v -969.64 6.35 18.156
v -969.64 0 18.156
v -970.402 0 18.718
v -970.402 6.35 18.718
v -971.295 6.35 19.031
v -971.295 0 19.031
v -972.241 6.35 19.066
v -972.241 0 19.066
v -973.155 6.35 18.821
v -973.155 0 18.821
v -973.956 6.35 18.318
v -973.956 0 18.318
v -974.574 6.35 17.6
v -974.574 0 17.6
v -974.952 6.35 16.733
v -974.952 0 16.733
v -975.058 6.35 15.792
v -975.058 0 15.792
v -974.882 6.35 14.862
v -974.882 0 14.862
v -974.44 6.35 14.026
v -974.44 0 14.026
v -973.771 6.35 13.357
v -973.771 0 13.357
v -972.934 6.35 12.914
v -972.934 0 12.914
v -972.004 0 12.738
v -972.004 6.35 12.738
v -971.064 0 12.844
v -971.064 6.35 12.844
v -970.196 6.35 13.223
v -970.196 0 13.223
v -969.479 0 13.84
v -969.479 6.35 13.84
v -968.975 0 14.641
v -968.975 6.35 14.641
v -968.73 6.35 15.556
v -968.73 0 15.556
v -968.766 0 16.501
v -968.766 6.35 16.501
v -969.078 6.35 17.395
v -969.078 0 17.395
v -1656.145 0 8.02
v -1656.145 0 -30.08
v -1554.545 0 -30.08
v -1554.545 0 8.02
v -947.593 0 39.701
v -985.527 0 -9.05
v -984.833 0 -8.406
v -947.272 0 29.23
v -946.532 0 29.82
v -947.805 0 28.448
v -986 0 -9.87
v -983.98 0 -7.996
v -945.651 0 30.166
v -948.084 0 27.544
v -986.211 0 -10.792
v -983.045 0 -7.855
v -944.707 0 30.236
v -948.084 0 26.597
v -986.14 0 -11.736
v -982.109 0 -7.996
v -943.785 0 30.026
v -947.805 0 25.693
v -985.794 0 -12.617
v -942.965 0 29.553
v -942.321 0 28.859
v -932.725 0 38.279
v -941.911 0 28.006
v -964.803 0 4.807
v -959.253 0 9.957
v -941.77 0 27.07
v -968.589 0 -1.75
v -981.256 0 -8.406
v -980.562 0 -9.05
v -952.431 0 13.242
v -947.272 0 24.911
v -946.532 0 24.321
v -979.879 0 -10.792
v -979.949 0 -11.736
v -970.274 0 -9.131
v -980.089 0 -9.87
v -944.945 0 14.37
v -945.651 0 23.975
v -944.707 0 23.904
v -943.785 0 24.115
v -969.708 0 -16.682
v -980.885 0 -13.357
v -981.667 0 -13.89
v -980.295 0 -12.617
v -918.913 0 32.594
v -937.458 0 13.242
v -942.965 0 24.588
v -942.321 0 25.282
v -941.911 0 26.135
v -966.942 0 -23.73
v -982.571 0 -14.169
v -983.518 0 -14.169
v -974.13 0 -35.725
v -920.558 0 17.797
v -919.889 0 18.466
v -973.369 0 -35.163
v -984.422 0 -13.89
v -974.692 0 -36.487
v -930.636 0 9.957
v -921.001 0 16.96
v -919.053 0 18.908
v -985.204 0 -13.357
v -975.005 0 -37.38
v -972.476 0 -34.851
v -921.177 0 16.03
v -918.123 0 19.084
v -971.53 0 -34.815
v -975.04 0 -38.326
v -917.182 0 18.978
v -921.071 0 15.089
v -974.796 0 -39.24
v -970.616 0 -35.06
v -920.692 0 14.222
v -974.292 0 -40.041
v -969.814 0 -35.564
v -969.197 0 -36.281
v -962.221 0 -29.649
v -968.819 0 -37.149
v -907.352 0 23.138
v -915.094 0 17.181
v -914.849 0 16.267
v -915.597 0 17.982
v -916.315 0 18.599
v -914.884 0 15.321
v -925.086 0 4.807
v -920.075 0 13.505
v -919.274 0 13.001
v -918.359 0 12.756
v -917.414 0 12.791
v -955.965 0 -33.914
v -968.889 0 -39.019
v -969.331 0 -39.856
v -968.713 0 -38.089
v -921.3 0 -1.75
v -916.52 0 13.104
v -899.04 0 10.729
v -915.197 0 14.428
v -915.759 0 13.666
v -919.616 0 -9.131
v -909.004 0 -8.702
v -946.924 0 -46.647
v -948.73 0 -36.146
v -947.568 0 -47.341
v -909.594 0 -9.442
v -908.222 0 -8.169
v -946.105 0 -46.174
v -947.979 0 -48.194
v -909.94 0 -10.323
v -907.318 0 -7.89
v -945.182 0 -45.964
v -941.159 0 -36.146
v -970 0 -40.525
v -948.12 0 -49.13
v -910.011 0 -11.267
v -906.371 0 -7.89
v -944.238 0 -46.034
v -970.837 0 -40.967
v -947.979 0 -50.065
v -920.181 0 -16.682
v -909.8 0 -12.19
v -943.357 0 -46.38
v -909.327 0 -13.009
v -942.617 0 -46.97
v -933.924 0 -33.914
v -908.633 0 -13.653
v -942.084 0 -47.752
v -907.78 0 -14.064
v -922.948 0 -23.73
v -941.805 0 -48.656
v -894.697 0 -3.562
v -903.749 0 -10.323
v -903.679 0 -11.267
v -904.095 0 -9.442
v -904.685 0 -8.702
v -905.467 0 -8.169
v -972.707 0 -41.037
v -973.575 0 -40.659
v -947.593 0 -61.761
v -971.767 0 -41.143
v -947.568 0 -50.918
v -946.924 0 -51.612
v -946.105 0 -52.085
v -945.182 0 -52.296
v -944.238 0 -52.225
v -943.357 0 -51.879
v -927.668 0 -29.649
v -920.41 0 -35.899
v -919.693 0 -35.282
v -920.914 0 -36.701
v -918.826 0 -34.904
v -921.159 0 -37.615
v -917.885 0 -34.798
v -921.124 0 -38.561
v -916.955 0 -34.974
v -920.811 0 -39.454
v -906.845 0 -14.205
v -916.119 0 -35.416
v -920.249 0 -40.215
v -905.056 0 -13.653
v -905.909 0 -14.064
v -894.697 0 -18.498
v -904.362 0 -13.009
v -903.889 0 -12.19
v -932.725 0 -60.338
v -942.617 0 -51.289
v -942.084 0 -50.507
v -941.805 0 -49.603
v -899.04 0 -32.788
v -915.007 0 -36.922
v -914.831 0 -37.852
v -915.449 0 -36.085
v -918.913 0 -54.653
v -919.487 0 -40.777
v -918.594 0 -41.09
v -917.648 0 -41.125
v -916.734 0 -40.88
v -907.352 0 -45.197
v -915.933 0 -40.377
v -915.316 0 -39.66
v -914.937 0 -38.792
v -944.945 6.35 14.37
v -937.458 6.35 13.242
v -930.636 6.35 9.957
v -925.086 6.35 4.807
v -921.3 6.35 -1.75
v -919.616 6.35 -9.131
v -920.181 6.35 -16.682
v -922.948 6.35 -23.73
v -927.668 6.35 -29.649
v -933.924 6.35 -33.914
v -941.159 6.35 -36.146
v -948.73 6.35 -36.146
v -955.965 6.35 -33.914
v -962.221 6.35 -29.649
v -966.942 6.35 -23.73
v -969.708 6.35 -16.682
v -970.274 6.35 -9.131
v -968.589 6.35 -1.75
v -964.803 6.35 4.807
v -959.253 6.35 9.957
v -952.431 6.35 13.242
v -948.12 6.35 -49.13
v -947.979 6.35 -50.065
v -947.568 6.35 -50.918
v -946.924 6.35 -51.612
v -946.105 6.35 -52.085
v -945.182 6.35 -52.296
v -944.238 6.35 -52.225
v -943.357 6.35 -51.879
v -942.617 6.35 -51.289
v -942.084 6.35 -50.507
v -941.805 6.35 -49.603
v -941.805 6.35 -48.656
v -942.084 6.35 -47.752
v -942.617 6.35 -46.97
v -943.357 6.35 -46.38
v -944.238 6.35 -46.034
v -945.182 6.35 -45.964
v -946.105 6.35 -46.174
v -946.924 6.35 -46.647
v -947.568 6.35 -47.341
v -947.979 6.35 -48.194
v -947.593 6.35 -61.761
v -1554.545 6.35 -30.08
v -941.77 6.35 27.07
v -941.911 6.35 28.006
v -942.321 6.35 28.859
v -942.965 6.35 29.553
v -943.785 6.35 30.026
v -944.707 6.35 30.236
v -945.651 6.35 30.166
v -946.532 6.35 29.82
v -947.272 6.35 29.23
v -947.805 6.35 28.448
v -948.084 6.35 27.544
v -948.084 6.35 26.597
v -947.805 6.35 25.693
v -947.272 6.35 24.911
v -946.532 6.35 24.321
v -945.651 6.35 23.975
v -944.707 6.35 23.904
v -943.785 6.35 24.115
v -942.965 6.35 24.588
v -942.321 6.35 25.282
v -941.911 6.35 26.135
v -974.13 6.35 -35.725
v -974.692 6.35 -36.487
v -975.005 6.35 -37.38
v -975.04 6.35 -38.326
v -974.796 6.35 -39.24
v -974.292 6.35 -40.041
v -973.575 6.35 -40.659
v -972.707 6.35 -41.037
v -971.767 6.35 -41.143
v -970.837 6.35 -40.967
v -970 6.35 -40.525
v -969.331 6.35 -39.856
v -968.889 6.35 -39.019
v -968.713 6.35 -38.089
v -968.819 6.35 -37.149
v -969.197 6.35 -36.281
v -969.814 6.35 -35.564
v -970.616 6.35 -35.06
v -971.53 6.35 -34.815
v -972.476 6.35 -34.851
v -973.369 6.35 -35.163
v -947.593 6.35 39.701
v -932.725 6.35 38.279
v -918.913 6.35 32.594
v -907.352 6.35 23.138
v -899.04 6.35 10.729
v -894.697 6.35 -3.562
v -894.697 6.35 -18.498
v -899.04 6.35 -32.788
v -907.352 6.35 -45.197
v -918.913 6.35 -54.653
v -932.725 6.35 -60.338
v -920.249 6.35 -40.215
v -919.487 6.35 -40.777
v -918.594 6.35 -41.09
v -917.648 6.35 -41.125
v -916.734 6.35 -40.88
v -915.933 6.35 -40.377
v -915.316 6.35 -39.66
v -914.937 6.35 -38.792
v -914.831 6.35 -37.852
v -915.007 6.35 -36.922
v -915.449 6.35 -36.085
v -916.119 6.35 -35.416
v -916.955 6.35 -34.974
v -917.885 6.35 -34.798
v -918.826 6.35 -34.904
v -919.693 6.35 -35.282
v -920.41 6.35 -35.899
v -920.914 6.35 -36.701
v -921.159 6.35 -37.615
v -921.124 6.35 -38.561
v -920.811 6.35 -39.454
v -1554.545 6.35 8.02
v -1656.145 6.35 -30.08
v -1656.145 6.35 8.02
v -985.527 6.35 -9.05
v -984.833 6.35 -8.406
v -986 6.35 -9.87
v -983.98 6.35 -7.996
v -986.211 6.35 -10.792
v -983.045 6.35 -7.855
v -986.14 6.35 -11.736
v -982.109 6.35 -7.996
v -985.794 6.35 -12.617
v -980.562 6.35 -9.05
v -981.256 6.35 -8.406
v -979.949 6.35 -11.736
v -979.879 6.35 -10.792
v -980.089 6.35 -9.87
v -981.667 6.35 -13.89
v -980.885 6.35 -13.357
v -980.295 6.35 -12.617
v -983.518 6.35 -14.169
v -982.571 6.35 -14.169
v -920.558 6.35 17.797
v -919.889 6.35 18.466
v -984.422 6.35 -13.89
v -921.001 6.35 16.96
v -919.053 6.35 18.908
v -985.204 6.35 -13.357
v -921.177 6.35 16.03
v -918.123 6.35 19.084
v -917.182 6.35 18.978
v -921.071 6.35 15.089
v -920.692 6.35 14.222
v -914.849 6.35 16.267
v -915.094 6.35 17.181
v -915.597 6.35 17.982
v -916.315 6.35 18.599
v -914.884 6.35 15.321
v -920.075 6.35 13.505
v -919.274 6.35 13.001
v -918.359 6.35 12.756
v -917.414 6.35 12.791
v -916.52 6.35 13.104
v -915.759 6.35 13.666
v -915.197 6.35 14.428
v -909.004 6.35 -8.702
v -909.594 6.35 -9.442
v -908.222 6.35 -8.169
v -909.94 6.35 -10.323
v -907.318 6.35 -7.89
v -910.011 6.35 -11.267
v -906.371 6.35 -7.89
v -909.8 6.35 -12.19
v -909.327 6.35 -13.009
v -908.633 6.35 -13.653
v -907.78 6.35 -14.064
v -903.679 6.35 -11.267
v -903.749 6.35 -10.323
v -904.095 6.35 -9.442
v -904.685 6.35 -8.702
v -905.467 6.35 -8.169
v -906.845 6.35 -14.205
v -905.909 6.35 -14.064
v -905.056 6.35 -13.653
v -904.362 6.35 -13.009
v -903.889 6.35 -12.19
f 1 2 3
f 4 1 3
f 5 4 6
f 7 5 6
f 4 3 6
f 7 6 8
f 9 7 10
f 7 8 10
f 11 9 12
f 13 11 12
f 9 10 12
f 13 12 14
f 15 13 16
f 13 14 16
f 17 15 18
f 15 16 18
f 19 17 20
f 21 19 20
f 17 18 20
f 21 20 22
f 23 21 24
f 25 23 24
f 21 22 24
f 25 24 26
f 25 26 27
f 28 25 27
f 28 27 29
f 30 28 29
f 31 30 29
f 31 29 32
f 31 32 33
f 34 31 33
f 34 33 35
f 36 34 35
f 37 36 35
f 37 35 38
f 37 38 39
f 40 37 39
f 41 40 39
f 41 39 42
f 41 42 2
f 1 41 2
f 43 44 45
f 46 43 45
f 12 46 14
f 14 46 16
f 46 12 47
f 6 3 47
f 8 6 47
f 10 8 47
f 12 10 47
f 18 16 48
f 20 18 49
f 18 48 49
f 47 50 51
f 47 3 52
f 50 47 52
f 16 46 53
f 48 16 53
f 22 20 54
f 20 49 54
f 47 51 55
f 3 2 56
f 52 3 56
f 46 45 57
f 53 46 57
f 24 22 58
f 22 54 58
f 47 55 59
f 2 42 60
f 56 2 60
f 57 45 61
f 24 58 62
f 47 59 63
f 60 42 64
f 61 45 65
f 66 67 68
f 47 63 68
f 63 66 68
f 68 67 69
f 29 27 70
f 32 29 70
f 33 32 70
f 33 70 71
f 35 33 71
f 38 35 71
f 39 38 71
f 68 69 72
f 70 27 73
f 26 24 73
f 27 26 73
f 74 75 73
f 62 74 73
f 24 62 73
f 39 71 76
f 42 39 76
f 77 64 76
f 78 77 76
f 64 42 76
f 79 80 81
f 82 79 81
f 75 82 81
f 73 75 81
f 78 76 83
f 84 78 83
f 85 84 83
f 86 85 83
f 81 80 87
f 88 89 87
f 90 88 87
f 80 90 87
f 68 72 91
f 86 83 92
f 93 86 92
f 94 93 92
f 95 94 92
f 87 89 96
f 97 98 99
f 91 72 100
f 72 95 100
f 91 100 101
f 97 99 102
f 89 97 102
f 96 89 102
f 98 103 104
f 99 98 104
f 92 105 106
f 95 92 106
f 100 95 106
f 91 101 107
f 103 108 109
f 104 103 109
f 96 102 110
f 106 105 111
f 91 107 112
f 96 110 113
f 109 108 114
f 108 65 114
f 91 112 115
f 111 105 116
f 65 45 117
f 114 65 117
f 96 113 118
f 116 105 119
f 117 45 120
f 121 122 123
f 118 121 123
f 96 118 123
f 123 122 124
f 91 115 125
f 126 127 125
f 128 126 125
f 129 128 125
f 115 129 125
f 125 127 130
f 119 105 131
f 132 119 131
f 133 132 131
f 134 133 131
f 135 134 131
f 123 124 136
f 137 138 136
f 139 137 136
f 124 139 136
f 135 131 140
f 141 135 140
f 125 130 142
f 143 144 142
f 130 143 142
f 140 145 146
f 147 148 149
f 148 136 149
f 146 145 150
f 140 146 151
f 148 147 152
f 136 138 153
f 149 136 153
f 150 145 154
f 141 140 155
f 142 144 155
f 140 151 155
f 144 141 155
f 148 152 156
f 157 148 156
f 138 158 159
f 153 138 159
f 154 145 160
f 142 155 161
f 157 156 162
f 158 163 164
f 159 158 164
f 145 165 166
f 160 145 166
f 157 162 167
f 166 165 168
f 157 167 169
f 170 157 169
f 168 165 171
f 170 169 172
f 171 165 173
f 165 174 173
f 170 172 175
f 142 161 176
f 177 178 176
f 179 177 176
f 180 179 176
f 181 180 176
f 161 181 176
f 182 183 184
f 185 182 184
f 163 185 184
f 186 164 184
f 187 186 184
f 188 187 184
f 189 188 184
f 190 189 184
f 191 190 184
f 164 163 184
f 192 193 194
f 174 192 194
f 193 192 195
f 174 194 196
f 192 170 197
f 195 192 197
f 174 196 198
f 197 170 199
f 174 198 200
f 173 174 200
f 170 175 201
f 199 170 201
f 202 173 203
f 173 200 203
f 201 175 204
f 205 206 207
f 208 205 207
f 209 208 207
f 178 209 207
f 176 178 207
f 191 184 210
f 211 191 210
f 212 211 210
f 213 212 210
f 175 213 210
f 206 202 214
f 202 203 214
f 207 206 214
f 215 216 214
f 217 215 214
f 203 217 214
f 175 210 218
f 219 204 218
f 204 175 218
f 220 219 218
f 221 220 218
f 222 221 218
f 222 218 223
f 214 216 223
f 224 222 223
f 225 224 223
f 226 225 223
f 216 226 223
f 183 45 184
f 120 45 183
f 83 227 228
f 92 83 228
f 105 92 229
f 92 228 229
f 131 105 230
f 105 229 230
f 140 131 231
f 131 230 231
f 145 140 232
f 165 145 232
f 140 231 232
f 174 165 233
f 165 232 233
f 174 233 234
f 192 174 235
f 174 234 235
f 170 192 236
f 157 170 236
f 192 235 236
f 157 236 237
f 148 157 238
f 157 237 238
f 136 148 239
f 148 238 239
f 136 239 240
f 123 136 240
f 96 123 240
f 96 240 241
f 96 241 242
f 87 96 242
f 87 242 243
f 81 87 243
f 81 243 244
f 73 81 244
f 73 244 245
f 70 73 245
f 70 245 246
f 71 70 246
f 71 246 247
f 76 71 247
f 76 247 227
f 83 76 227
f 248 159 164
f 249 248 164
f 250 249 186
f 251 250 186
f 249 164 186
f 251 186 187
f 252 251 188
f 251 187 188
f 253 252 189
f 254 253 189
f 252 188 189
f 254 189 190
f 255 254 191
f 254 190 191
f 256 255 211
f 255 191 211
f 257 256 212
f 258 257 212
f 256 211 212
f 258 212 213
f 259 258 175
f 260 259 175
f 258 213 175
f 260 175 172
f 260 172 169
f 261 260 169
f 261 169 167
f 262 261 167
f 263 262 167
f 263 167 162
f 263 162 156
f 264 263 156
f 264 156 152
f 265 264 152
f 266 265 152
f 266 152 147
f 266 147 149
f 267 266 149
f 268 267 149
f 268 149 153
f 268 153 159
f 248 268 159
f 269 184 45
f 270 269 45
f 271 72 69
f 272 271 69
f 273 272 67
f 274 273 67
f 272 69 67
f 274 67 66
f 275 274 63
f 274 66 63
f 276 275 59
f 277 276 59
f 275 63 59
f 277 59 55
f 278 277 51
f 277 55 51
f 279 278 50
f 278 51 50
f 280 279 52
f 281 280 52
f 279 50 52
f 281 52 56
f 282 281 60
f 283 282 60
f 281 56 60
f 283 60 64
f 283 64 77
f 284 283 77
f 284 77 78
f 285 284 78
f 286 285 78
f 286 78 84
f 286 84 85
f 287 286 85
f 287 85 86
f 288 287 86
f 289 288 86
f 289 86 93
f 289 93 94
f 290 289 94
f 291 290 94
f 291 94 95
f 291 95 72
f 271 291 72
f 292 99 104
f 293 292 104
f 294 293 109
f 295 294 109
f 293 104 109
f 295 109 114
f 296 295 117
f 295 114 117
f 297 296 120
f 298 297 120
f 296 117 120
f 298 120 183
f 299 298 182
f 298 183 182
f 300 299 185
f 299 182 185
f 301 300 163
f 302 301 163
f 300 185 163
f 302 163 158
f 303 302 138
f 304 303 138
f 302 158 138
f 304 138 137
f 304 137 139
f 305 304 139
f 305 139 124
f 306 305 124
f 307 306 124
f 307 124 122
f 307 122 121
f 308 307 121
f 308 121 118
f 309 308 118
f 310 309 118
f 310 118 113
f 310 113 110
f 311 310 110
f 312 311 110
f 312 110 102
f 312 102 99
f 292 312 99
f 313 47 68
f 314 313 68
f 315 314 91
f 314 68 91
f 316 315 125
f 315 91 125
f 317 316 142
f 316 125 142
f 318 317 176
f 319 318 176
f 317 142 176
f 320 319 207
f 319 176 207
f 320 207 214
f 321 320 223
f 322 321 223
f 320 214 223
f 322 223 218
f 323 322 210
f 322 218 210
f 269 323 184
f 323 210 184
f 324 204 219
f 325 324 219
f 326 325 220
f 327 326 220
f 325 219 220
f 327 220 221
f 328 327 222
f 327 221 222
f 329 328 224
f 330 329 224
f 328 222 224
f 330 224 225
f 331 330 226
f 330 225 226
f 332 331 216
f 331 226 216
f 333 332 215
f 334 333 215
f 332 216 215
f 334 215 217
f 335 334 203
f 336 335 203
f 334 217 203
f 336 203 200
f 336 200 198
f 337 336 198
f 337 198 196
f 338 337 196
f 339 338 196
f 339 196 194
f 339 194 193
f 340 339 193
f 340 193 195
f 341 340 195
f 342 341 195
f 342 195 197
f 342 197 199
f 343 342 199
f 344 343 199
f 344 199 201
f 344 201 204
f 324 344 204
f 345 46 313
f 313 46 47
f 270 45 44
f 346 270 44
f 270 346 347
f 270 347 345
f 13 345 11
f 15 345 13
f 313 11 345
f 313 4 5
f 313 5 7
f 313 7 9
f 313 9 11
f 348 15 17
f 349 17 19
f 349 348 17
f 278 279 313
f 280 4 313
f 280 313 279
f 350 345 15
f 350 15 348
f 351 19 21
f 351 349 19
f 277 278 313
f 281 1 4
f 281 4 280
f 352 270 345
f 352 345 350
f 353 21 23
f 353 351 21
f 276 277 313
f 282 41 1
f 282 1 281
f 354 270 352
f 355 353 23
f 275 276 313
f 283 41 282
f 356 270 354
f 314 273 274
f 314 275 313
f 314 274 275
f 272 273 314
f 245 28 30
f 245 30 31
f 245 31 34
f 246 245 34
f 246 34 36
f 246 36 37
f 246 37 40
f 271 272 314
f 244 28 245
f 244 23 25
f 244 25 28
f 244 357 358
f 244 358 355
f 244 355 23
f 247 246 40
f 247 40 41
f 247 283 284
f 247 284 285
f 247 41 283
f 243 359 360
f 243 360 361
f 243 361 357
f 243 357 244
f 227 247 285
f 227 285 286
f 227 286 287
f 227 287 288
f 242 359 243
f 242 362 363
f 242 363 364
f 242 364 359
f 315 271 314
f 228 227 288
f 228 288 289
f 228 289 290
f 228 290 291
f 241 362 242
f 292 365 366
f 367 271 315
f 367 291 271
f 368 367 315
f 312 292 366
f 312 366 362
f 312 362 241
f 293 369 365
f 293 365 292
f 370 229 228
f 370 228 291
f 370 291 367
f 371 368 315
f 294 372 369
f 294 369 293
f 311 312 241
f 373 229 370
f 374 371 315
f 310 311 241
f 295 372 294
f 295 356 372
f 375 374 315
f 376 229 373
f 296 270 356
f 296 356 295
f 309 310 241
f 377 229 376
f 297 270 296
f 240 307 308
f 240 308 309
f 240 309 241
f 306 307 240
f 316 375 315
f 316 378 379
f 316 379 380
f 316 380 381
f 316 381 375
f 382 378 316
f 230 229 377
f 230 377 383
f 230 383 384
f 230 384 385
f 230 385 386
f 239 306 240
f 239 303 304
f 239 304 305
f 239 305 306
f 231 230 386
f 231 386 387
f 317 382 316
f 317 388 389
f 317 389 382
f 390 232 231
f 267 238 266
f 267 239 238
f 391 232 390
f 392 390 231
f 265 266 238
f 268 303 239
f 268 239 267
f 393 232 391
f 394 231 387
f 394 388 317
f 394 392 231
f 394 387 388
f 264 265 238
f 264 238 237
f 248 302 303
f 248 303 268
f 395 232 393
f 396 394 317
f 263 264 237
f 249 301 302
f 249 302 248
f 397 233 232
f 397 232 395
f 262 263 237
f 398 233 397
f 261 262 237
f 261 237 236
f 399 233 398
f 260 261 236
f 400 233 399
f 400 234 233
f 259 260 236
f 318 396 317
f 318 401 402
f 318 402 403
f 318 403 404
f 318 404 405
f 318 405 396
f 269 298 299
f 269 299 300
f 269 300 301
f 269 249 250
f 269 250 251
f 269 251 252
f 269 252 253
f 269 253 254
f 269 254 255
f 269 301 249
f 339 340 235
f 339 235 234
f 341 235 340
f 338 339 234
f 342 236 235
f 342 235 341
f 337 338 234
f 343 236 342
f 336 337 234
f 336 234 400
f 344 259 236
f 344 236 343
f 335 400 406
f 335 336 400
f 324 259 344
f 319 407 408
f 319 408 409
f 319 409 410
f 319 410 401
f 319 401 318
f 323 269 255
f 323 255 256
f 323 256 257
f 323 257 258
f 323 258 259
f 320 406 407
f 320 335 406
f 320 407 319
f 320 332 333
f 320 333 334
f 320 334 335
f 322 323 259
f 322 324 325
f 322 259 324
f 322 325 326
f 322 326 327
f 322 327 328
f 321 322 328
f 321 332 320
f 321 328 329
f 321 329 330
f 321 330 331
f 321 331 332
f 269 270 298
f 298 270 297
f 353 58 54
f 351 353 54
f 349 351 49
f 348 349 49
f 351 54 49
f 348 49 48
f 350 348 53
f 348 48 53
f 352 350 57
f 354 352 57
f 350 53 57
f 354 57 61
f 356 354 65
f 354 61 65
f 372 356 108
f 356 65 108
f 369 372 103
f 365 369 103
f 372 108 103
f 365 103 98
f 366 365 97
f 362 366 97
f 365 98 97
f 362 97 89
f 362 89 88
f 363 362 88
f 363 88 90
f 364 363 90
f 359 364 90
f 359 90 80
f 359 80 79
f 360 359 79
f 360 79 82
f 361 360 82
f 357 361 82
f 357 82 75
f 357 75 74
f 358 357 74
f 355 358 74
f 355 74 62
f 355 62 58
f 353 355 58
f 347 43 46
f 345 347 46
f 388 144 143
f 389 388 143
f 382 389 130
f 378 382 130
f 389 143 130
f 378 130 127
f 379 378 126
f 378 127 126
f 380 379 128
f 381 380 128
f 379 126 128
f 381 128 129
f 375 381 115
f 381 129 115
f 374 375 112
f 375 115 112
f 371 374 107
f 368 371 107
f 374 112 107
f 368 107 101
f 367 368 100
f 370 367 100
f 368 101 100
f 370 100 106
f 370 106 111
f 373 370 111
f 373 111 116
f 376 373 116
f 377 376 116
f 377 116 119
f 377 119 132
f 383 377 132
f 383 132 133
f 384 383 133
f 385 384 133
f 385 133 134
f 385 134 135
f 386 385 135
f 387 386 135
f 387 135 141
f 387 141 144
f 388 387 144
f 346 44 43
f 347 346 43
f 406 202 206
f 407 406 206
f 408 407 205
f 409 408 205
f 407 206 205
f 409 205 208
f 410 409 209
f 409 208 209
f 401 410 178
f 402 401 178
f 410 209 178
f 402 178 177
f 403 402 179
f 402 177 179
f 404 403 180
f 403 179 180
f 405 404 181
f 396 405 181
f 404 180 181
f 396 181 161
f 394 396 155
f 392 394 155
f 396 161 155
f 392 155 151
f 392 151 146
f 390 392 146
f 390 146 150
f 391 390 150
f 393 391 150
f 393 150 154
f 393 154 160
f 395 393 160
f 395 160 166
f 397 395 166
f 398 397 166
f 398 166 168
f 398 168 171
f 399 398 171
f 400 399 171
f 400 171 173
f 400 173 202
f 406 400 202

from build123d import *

# Parameters (mm, degrees)
BOSS_EXTRUDE1_DEPTH         = 6.35
SKETCH6_R                   = 25.4
CUT_EXTRUDE1_DEPTH          = 1658.310568825
F_1_4_0_25_DIAMETER_HOLE1_D = 6.35
CIRPATTERN1_COUNT           = 8


with BuildPart() as part:
    # Sketch5 → Boss-Extrude1 (new body)
    with BuildSketch(Plane(origin=(0, 0, 0), x_dir=(1, 0, 0), z_dir=(0, 1, 0))):
        with BuildLine():
            Line((-947.592639328, 61.760579697), (-1554.544647829, 30.079641))
            Line((-1554.544647829, 30.079641), (-1656.144647829, 30.079641))
            Line((-1656.144647829, 30.079641), (-1656.144647829, -8.020359))
            Line((-1656.144647829, -8.020359), (-1554.544647829, -8.020359))
            Line((-1554.544647829, -8.020359), (-947.592639328, -39.701297696))
            ThreePointArc((-947.592639328, -39.701297696), (-894.144647829, 11.029641), (-947.592639328, 61.760579697))
        make_face()
    extrude(amount=BOSS_EXTRUDE1_DEPTH)

    # Sketch6 → Cut-Extrude1 (cut, through all)
    with BuildSketch(Plane(origin=(0, 6.35, 0), x_dir=(1, 0, 0), z_dir=(0, 1, 0))):
        with Locations(Location((-944.944647829, 11.029641, 0), (0, 0, 270))):
            Circle(SKETCH6_R)
    extrude(amount=-CUT_EXTRUDE1_DEPTH, mode=Mode.SUBTRACT)

    # 1/4 (0.25) Diameter Hole1 (through all)
    with Locations(Plane(origin=(0, 6.35, 0), x_dir=(1, 0, 0), z_dir=(0, 1, 0))):
        with Locations((-944.944647829, 49.129641)):
            f_1_4_0_25_diameter_hole1 = Hole(F_1_4_0_25_DIAMETER_HOLE1_D / 2)

    # CirPattern1: 1/4 (0.25) Diameter Hole1 ×8 about axis
    cirpattern1_axis = Axis((-944.944647829, 0, -11.029641), (0, 1, 0))
    for i in range(1, CIRPATTERN1_COUNT):
        add(f_1_4_0_25_diameter_hole1.rotate(cirpattern1_axis, i * 360 / CIRPATTERN1_COUNT), mode=Mode.SUBTRACT)


solid = part.part
